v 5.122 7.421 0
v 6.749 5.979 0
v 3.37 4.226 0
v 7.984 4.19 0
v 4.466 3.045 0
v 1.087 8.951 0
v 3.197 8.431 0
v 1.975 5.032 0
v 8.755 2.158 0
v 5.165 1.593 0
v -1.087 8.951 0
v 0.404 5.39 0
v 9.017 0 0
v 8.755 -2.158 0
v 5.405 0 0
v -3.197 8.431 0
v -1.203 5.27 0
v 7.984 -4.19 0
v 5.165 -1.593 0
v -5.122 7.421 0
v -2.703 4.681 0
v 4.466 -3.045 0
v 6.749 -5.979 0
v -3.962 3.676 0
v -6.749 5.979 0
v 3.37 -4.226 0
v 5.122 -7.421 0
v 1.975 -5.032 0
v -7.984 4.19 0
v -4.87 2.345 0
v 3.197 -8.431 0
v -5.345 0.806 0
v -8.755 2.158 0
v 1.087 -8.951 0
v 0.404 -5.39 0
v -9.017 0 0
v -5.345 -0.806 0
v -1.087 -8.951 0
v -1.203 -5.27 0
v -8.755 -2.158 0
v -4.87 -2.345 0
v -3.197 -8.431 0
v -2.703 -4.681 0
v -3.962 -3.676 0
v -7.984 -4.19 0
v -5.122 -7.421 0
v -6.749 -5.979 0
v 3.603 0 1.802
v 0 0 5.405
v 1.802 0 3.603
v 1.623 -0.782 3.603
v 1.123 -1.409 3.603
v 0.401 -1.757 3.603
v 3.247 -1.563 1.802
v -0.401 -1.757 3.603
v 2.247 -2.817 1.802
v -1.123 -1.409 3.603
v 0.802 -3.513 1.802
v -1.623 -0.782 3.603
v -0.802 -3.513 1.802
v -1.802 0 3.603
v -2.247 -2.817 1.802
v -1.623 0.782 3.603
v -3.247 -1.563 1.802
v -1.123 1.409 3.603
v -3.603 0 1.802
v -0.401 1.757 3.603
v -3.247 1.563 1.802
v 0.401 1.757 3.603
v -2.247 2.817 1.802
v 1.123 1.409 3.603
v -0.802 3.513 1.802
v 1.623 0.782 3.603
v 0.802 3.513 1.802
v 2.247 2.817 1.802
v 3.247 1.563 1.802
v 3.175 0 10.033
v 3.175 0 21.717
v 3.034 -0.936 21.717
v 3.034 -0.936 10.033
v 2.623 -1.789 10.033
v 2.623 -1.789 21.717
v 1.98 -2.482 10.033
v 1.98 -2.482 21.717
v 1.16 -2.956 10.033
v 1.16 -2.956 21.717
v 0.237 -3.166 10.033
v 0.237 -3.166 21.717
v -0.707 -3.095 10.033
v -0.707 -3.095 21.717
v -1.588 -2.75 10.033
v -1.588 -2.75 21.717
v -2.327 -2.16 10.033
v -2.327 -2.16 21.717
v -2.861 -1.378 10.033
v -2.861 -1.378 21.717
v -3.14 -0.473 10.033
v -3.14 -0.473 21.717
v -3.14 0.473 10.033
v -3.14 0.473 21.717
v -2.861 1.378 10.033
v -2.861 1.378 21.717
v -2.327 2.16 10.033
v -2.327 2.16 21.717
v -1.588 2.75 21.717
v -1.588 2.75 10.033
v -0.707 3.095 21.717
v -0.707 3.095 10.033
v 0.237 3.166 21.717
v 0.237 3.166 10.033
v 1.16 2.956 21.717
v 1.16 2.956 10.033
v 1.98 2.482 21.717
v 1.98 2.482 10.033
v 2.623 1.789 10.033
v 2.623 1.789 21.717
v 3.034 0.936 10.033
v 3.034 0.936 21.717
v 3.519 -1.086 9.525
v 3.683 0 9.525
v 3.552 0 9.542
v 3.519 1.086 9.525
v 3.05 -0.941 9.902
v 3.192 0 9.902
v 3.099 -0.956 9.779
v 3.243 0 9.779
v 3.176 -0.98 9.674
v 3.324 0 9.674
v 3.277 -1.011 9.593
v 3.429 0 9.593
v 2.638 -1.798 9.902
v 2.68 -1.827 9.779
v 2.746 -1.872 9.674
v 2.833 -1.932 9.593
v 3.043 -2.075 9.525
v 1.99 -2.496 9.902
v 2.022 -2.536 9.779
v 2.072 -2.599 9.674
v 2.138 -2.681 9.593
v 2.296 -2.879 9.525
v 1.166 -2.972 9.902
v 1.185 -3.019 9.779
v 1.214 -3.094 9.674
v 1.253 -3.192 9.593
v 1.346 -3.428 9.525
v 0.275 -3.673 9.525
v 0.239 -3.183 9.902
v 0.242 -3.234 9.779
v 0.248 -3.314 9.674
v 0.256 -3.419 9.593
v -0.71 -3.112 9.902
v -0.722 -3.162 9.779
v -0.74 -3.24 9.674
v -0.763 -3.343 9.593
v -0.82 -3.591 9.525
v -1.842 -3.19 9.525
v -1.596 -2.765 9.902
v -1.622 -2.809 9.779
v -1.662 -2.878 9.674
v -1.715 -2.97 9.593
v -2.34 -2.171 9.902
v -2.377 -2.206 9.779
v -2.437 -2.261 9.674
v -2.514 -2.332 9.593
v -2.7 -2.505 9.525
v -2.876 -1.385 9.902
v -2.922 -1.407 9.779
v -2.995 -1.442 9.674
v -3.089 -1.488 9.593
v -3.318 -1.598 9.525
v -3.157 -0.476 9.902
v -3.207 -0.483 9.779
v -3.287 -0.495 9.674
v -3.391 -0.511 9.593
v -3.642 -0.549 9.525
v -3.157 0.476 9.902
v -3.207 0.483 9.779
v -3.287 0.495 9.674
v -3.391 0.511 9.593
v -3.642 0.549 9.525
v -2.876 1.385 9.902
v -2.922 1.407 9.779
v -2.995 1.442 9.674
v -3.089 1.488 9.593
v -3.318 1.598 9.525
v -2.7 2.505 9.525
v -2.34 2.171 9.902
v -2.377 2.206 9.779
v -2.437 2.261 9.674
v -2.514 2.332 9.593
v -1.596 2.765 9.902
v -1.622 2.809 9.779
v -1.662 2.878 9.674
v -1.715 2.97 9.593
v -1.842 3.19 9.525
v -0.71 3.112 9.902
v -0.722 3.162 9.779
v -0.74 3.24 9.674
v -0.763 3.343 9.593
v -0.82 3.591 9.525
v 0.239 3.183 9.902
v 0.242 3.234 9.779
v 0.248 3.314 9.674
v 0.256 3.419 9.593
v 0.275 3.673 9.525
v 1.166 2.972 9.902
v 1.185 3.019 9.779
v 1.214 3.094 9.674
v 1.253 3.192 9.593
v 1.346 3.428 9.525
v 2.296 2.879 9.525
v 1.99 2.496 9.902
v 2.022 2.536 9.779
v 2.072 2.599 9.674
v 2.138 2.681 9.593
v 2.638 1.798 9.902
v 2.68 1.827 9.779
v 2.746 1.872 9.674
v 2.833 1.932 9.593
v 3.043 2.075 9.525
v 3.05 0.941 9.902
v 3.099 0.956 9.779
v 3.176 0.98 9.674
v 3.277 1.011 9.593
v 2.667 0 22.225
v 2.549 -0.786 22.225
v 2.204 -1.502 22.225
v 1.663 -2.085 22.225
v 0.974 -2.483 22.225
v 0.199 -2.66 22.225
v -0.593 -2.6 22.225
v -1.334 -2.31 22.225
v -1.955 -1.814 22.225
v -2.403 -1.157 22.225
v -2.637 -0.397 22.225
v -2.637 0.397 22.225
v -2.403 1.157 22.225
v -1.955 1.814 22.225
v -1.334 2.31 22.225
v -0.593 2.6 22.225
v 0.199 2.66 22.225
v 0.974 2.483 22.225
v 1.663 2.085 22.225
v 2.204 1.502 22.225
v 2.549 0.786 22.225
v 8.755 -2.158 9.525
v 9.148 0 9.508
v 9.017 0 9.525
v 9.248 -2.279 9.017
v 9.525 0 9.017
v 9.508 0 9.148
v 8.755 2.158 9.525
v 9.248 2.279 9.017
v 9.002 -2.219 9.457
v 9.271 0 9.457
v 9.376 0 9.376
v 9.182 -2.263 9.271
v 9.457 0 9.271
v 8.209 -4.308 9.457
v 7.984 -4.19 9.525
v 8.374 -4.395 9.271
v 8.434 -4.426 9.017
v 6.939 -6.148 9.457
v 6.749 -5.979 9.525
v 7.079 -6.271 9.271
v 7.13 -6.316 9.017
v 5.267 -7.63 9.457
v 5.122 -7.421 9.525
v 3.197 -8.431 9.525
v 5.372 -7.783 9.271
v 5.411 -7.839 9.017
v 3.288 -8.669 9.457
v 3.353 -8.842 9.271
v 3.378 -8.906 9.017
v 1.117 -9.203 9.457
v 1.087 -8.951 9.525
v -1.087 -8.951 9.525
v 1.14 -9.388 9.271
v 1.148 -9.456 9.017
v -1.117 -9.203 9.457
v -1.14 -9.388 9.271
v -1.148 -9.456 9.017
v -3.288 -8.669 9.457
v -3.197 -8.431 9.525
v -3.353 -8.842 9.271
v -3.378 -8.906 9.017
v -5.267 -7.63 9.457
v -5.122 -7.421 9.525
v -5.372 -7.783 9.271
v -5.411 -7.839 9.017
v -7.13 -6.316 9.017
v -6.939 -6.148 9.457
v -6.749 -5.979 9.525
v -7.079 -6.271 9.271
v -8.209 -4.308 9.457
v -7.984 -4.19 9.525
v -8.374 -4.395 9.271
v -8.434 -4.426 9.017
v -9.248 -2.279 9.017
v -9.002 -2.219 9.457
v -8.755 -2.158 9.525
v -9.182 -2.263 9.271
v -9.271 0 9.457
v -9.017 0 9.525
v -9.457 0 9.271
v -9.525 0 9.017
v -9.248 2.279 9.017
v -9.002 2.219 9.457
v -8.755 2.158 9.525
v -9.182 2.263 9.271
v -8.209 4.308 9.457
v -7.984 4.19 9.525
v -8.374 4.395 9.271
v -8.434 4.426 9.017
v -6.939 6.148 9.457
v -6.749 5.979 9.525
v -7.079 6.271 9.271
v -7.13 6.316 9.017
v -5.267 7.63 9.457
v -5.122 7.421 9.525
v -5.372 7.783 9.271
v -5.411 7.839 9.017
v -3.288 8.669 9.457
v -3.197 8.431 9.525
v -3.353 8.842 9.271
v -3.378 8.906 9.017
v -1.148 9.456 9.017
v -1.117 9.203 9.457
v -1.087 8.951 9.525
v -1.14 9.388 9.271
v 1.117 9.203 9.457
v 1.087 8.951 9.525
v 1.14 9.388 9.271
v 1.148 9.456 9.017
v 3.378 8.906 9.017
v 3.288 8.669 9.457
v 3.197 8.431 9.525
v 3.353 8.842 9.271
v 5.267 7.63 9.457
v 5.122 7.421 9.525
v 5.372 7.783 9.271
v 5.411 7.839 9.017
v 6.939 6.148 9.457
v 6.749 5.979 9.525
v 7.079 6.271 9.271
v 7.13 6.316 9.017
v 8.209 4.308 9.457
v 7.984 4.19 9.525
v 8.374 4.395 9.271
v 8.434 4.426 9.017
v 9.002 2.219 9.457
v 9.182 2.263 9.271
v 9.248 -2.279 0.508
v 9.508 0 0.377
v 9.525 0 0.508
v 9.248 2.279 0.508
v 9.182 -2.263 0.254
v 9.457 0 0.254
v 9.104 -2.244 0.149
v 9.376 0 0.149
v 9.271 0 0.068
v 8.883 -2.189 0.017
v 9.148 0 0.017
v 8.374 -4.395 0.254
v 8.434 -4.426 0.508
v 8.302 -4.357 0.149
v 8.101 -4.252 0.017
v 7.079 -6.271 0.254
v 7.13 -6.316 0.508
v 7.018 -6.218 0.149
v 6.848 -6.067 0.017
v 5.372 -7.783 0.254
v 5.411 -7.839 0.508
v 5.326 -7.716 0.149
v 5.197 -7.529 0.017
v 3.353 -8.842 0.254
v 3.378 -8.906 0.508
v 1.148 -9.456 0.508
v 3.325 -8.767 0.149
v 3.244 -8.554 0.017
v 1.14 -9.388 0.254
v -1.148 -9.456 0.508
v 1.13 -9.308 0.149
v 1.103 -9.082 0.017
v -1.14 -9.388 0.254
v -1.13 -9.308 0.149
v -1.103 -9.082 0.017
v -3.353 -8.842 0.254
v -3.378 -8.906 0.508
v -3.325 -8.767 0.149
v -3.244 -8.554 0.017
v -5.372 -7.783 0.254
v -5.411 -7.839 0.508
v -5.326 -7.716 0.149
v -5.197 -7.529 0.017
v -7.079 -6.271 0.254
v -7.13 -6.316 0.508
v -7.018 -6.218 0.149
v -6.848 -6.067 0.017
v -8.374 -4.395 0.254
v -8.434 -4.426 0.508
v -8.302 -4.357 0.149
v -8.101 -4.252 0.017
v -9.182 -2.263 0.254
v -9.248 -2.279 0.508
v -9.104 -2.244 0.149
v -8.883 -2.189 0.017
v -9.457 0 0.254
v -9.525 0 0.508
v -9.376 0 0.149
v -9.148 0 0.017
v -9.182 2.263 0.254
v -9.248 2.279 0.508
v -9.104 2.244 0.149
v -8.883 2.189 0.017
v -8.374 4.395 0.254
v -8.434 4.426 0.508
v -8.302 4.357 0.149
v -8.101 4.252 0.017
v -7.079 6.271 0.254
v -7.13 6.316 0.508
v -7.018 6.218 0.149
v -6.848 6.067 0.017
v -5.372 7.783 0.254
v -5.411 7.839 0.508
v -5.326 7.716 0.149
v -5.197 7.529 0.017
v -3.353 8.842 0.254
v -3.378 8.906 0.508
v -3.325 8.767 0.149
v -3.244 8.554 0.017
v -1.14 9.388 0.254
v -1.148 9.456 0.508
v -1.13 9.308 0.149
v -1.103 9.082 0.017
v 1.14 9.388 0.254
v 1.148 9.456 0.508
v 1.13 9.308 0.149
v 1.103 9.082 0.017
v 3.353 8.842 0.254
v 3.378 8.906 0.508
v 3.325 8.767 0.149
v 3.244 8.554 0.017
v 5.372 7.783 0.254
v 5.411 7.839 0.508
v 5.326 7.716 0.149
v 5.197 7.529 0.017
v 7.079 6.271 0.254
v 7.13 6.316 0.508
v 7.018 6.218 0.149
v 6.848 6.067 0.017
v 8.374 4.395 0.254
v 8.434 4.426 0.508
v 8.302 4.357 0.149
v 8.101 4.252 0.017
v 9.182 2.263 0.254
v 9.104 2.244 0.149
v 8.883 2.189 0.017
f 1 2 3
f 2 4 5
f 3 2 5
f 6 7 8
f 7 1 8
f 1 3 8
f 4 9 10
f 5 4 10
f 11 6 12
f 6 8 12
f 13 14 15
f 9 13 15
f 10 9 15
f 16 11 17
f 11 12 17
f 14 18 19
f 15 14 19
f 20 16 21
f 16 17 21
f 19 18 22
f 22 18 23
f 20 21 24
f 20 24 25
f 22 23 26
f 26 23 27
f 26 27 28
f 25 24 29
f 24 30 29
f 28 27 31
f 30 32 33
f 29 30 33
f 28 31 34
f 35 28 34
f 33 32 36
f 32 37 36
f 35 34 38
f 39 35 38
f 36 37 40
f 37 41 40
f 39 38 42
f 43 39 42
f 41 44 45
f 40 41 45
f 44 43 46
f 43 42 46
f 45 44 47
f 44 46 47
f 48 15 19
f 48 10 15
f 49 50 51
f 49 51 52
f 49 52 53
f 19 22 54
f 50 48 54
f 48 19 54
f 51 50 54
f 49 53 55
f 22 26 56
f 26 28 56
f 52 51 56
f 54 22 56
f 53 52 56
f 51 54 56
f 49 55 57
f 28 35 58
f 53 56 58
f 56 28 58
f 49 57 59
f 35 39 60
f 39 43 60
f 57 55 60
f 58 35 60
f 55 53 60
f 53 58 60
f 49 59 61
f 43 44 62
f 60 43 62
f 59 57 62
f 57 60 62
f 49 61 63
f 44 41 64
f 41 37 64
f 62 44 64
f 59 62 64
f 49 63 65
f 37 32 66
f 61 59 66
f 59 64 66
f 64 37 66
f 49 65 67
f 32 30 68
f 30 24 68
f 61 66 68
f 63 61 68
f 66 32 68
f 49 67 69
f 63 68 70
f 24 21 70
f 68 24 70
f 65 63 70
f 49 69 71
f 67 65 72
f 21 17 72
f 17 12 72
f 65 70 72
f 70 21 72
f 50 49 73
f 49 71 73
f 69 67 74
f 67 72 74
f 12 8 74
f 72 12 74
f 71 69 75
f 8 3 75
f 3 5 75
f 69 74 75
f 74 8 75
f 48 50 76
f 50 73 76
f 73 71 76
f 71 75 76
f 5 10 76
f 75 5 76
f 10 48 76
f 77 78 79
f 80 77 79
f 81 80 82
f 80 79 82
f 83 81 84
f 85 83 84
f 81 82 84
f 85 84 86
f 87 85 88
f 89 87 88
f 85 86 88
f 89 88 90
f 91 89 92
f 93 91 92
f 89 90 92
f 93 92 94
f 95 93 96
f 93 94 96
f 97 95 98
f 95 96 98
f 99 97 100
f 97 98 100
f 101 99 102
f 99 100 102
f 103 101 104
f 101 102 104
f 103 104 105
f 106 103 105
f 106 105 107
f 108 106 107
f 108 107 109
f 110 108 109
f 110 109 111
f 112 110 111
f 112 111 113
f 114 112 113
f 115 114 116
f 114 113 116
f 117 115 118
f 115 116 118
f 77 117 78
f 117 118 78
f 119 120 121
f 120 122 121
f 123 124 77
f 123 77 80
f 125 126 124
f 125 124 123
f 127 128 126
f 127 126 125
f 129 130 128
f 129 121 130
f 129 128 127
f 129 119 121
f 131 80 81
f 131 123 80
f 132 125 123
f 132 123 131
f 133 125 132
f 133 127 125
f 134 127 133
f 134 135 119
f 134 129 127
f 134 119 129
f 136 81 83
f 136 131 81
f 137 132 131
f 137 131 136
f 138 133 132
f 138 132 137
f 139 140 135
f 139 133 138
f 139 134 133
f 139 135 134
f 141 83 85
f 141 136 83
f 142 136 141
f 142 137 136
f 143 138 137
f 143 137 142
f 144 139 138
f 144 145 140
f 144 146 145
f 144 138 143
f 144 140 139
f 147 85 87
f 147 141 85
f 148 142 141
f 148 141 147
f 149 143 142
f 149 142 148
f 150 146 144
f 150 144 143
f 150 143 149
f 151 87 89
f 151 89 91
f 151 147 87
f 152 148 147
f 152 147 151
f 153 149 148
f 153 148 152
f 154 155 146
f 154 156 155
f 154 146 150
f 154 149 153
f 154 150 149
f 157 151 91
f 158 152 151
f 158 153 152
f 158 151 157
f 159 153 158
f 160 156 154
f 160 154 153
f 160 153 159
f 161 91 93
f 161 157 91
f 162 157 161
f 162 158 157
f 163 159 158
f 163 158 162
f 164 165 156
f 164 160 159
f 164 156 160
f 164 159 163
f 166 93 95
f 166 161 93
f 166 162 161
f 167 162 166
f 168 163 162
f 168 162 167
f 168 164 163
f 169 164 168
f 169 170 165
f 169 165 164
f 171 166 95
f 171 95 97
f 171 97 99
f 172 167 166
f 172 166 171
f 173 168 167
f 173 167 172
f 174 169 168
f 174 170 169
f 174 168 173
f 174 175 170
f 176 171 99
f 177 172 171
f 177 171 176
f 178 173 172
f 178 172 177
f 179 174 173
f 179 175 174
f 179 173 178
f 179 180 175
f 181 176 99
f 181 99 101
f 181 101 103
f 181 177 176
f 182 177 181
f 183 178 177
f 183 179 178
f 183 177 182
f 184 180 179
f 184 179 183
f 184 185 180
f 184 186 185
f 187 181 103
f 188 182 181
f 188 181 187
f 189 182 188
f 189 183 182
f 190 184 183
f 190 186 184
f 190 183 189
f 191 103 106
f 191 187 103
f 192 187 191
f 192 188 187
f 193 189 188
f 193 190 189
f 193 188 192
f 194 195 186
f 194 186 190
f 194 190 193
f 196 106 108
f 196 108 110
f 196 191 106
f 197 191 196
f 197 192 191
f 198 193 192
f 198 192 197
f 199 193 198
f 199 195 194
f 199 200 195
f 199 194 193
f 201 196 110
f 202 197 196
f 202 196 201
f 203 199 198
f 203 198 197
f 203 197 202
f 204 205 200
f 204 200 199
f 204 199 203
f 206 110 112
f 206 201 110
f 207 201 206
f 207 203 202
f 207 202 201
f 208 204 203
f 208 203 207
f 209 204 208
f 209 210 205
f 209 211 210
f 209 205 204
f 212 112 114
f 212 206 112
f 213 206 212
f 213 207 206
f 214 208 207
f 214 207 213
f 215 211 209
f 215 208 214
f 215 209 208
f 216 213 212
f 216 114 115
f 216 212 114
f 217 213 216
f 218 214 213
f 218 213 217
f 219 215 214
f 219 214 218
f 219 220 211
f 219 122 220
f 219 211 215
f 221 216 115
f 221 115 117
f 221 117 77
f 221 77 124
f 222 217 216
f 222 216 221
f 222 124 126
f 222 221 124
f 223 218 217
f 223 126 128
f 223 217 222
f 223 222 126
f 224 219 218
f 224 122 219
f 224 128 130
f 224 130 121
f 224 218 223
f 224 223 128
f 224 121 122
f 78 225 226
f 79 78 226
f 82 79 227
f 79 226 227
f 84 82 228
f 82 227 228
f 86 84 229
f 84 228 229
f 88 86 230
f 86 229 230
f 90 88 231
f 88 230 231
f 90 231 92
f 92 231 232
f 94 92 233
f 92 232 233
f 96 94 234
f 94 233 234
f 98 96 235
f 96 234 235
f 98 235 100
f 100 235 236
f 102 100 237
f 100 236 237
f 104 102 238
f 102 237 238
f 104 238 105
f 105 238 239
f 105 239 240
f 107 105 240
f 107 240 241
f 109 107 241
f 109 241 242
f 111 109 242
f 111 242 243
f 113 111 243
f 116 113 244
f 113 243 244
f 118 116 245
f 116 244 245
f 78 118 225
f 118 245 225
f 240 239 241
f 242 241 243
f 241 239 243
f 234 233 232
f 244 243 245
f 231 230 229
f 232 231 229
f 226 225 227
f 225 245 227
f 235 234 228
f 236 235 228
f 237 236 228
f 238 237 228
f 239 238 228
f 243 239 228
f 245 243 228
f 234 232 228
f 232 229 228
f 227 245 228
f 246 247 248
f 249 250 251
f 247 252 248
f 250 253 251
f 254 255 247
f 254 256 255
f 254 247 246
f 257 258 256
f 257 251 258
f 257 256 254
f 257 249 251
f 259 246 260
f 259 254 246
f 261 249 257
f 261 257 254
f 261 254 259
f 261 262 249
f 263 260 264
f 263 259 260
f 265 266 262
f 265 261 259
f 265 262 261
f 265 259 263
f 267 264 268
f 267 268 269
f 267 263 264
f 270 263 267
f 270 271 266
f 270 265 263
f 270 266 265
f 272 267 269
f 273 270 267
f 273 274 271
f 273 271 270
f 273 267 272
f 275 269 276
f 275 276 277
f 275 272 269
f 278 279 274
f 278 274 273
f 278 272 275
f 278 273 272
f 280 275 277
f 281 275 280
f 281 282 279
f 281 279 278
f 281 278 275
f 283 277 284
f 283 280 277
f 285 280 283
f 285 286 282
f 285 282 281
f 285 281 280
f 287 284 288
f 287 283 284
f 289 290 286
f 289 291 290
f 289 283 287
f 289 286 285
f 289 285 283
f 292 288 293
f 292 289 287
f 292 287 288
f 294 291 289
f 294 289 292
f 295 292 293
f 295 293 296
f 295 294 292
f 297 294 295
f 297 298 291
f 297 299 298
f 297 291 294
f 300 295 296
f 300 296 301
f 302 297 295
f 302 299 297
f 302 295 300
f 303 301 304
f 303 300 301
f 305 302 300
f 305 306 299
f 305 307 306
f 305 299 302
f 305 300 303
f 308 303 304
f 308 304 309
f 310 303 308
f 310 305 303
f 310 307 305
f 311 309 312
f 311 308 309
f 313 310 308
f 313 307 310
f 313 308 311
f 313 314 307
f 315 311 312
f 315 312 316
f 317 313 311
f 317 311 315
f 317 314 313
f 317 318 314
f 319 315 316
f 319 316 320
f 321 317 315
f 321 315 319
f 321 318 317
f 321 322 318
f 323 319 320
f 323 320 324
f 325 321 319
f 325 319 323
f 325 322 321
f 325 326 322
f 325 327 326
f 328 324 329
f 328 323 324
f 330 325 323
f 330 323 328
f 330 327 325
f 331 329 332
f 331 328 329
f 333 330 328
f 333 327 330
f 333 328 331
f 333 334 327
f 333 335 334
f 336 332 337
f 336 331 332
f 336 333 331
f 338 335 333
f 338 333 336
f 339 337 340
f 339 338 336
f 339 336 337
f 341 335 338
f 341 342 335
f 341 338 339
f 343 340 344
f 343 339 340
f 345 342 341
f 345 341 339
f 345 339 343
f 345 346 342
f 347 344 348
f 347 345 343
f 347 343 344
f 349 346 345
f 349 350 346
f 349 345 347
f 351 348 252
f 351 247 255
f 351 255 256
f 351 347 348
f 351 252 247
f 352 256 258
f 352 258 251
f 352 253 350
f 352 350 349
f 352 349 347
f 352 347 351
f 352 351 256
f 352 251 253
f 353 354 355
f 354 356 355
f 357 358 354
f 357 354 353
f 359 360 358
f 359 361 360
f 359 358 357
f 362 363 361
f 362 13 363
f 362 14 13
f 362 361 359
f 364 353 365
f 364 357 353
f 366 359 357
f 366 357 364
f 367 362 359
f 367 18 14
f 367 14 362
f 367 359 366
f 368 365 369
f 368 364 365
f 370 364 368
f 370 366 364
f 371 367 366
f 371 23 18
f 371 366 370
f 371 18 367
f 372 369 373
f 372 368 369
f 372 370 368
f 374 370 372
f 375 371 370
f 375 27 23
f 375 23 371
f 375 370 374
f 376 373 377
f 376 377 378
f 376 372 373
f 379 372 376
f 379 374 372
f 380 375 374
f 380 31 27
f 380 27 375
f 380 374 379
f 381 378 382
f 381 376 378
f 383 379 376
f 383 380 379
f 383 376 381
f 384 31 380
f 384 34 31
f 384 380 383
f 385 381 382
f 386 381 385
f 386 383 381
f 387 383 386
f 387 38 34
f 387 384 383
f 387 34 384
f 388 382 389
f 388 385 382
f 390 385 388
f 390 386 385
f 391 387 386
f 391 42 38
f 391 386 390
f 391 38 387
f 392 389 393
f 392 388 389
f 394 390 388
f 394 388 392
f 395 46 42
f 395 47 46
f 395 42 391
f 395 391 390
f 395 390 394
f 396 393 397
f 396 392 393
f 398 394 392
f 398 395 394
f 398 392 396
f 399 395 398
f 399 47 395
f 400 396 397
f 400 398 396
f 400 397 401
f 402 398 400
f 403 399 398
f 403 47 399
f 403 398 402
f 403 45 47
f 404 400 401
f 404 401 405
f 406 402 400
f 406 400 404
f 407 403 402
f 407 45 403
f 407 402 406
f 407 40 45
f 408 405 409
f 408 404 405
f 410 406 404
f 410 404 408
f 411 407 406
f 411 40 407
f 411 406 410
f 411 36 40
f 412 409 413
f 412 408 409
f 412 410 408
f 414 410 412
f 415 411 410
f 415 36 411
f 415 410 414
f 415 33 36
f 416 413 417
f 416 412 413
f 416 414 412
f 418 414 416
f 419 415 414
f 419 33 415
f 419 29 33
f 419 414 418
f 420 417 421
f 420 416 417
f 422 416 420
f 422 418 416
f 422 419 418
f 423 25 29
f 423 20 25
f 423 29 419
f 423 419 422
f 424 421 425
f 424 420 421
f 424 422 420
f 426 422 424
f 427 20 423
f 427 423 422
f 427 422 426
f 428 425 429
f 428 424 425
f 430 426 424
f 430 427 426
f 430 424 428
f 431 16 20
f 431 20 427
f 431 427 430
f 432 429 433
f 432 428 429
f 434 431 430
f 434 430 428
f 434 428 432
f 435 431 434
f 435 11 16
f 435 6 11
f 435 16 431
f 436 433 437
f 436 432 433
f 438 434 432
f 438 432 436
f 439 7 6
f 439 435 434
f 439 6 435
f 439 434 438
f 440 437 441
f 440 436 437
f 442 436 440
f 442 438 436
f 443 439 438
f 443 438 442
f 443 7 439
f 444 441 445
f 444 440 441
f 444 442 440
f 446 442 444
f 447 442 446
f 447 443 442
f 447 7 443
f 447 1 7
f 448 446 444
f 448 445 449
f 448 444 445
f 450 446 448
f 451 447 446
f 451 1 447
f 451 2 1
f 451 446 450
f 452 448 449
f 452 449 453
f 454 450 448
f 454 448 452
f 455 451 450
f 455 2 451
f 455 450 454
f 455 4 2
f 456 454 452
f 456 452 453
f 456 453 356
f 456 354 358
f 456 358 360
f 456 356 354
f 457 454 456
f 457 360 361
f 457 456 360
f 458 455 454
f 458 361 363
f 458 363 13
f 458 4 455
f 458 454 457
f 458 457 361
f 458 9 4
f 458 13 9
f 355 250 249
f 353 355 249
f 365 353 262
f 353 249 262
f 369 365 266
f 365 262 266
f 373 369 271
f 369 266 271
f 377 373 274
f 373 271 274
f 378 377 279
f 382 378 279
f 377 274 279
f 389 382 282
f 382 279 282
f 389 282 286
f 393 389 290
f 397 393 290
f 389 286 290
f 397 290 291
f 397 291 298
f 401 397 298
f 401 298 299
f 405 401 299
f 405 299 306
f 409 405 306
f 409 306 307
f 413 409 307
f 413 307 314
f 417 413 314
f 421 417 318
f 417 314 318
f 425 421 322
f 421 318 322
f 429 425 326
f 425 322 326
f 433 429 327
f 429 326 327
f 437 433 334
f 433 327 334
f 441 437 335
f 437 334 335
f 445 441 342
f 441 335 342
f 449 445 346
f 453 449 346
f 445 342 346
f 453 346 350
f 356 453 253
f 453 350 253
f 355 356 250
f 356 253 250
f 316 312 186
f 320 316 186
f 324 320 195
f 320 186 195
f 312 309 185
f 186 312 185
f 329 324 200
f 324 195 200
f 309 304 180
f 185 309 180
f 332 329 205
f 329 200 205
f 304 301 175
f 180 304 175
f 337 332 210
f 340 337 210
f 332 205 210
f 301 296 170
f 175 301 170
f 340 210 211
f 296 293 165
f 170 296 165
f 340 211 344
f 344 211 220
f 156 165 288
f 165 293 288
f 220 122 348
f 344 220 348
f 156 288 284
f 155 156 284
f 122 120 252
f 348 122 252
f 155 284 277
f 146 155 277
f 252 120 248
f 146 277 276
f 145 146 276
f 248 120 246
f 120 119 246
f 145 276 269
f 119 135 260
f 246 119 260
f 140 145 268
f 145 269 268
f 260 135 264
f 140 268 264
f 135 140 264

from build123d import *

# Parameters (mm, degrees)
F2_SIZE = 0.508
F3_R    = 0.508


with BuildPart() as f1:
    # F0 (on Front) → F1 (revolve)
    with BuildSketch(Plane.XZ):
        Polygon((0, 22.225), (0, 5.405244), (5.405244, 0), (9.525, 0), (9.525, 9.525), (3.175, 9.525), (3.175, 22.225), align=None)
    revolve(axis=Axis((0, 0, 17.601646), (0, 0, -1)))

    # F2
    f2_edges = [f1.edges().sort_by_distance(p)[0] for p in [
        (-3.175, 0, 22.225),
    ]]
    chamfer(f2_edges, length=F2_SIZE)

    # F3
    f3_edges = [f1.edges().sort_by_distance(p)[0] for p in [
        (-9.525, 0, 9.525),
        (-3.175, 0, 9.525),
        (-9.525, 0, 0),
    ]]
    fillet(f3_edges, radius=F3_R)


solid = f1.part
